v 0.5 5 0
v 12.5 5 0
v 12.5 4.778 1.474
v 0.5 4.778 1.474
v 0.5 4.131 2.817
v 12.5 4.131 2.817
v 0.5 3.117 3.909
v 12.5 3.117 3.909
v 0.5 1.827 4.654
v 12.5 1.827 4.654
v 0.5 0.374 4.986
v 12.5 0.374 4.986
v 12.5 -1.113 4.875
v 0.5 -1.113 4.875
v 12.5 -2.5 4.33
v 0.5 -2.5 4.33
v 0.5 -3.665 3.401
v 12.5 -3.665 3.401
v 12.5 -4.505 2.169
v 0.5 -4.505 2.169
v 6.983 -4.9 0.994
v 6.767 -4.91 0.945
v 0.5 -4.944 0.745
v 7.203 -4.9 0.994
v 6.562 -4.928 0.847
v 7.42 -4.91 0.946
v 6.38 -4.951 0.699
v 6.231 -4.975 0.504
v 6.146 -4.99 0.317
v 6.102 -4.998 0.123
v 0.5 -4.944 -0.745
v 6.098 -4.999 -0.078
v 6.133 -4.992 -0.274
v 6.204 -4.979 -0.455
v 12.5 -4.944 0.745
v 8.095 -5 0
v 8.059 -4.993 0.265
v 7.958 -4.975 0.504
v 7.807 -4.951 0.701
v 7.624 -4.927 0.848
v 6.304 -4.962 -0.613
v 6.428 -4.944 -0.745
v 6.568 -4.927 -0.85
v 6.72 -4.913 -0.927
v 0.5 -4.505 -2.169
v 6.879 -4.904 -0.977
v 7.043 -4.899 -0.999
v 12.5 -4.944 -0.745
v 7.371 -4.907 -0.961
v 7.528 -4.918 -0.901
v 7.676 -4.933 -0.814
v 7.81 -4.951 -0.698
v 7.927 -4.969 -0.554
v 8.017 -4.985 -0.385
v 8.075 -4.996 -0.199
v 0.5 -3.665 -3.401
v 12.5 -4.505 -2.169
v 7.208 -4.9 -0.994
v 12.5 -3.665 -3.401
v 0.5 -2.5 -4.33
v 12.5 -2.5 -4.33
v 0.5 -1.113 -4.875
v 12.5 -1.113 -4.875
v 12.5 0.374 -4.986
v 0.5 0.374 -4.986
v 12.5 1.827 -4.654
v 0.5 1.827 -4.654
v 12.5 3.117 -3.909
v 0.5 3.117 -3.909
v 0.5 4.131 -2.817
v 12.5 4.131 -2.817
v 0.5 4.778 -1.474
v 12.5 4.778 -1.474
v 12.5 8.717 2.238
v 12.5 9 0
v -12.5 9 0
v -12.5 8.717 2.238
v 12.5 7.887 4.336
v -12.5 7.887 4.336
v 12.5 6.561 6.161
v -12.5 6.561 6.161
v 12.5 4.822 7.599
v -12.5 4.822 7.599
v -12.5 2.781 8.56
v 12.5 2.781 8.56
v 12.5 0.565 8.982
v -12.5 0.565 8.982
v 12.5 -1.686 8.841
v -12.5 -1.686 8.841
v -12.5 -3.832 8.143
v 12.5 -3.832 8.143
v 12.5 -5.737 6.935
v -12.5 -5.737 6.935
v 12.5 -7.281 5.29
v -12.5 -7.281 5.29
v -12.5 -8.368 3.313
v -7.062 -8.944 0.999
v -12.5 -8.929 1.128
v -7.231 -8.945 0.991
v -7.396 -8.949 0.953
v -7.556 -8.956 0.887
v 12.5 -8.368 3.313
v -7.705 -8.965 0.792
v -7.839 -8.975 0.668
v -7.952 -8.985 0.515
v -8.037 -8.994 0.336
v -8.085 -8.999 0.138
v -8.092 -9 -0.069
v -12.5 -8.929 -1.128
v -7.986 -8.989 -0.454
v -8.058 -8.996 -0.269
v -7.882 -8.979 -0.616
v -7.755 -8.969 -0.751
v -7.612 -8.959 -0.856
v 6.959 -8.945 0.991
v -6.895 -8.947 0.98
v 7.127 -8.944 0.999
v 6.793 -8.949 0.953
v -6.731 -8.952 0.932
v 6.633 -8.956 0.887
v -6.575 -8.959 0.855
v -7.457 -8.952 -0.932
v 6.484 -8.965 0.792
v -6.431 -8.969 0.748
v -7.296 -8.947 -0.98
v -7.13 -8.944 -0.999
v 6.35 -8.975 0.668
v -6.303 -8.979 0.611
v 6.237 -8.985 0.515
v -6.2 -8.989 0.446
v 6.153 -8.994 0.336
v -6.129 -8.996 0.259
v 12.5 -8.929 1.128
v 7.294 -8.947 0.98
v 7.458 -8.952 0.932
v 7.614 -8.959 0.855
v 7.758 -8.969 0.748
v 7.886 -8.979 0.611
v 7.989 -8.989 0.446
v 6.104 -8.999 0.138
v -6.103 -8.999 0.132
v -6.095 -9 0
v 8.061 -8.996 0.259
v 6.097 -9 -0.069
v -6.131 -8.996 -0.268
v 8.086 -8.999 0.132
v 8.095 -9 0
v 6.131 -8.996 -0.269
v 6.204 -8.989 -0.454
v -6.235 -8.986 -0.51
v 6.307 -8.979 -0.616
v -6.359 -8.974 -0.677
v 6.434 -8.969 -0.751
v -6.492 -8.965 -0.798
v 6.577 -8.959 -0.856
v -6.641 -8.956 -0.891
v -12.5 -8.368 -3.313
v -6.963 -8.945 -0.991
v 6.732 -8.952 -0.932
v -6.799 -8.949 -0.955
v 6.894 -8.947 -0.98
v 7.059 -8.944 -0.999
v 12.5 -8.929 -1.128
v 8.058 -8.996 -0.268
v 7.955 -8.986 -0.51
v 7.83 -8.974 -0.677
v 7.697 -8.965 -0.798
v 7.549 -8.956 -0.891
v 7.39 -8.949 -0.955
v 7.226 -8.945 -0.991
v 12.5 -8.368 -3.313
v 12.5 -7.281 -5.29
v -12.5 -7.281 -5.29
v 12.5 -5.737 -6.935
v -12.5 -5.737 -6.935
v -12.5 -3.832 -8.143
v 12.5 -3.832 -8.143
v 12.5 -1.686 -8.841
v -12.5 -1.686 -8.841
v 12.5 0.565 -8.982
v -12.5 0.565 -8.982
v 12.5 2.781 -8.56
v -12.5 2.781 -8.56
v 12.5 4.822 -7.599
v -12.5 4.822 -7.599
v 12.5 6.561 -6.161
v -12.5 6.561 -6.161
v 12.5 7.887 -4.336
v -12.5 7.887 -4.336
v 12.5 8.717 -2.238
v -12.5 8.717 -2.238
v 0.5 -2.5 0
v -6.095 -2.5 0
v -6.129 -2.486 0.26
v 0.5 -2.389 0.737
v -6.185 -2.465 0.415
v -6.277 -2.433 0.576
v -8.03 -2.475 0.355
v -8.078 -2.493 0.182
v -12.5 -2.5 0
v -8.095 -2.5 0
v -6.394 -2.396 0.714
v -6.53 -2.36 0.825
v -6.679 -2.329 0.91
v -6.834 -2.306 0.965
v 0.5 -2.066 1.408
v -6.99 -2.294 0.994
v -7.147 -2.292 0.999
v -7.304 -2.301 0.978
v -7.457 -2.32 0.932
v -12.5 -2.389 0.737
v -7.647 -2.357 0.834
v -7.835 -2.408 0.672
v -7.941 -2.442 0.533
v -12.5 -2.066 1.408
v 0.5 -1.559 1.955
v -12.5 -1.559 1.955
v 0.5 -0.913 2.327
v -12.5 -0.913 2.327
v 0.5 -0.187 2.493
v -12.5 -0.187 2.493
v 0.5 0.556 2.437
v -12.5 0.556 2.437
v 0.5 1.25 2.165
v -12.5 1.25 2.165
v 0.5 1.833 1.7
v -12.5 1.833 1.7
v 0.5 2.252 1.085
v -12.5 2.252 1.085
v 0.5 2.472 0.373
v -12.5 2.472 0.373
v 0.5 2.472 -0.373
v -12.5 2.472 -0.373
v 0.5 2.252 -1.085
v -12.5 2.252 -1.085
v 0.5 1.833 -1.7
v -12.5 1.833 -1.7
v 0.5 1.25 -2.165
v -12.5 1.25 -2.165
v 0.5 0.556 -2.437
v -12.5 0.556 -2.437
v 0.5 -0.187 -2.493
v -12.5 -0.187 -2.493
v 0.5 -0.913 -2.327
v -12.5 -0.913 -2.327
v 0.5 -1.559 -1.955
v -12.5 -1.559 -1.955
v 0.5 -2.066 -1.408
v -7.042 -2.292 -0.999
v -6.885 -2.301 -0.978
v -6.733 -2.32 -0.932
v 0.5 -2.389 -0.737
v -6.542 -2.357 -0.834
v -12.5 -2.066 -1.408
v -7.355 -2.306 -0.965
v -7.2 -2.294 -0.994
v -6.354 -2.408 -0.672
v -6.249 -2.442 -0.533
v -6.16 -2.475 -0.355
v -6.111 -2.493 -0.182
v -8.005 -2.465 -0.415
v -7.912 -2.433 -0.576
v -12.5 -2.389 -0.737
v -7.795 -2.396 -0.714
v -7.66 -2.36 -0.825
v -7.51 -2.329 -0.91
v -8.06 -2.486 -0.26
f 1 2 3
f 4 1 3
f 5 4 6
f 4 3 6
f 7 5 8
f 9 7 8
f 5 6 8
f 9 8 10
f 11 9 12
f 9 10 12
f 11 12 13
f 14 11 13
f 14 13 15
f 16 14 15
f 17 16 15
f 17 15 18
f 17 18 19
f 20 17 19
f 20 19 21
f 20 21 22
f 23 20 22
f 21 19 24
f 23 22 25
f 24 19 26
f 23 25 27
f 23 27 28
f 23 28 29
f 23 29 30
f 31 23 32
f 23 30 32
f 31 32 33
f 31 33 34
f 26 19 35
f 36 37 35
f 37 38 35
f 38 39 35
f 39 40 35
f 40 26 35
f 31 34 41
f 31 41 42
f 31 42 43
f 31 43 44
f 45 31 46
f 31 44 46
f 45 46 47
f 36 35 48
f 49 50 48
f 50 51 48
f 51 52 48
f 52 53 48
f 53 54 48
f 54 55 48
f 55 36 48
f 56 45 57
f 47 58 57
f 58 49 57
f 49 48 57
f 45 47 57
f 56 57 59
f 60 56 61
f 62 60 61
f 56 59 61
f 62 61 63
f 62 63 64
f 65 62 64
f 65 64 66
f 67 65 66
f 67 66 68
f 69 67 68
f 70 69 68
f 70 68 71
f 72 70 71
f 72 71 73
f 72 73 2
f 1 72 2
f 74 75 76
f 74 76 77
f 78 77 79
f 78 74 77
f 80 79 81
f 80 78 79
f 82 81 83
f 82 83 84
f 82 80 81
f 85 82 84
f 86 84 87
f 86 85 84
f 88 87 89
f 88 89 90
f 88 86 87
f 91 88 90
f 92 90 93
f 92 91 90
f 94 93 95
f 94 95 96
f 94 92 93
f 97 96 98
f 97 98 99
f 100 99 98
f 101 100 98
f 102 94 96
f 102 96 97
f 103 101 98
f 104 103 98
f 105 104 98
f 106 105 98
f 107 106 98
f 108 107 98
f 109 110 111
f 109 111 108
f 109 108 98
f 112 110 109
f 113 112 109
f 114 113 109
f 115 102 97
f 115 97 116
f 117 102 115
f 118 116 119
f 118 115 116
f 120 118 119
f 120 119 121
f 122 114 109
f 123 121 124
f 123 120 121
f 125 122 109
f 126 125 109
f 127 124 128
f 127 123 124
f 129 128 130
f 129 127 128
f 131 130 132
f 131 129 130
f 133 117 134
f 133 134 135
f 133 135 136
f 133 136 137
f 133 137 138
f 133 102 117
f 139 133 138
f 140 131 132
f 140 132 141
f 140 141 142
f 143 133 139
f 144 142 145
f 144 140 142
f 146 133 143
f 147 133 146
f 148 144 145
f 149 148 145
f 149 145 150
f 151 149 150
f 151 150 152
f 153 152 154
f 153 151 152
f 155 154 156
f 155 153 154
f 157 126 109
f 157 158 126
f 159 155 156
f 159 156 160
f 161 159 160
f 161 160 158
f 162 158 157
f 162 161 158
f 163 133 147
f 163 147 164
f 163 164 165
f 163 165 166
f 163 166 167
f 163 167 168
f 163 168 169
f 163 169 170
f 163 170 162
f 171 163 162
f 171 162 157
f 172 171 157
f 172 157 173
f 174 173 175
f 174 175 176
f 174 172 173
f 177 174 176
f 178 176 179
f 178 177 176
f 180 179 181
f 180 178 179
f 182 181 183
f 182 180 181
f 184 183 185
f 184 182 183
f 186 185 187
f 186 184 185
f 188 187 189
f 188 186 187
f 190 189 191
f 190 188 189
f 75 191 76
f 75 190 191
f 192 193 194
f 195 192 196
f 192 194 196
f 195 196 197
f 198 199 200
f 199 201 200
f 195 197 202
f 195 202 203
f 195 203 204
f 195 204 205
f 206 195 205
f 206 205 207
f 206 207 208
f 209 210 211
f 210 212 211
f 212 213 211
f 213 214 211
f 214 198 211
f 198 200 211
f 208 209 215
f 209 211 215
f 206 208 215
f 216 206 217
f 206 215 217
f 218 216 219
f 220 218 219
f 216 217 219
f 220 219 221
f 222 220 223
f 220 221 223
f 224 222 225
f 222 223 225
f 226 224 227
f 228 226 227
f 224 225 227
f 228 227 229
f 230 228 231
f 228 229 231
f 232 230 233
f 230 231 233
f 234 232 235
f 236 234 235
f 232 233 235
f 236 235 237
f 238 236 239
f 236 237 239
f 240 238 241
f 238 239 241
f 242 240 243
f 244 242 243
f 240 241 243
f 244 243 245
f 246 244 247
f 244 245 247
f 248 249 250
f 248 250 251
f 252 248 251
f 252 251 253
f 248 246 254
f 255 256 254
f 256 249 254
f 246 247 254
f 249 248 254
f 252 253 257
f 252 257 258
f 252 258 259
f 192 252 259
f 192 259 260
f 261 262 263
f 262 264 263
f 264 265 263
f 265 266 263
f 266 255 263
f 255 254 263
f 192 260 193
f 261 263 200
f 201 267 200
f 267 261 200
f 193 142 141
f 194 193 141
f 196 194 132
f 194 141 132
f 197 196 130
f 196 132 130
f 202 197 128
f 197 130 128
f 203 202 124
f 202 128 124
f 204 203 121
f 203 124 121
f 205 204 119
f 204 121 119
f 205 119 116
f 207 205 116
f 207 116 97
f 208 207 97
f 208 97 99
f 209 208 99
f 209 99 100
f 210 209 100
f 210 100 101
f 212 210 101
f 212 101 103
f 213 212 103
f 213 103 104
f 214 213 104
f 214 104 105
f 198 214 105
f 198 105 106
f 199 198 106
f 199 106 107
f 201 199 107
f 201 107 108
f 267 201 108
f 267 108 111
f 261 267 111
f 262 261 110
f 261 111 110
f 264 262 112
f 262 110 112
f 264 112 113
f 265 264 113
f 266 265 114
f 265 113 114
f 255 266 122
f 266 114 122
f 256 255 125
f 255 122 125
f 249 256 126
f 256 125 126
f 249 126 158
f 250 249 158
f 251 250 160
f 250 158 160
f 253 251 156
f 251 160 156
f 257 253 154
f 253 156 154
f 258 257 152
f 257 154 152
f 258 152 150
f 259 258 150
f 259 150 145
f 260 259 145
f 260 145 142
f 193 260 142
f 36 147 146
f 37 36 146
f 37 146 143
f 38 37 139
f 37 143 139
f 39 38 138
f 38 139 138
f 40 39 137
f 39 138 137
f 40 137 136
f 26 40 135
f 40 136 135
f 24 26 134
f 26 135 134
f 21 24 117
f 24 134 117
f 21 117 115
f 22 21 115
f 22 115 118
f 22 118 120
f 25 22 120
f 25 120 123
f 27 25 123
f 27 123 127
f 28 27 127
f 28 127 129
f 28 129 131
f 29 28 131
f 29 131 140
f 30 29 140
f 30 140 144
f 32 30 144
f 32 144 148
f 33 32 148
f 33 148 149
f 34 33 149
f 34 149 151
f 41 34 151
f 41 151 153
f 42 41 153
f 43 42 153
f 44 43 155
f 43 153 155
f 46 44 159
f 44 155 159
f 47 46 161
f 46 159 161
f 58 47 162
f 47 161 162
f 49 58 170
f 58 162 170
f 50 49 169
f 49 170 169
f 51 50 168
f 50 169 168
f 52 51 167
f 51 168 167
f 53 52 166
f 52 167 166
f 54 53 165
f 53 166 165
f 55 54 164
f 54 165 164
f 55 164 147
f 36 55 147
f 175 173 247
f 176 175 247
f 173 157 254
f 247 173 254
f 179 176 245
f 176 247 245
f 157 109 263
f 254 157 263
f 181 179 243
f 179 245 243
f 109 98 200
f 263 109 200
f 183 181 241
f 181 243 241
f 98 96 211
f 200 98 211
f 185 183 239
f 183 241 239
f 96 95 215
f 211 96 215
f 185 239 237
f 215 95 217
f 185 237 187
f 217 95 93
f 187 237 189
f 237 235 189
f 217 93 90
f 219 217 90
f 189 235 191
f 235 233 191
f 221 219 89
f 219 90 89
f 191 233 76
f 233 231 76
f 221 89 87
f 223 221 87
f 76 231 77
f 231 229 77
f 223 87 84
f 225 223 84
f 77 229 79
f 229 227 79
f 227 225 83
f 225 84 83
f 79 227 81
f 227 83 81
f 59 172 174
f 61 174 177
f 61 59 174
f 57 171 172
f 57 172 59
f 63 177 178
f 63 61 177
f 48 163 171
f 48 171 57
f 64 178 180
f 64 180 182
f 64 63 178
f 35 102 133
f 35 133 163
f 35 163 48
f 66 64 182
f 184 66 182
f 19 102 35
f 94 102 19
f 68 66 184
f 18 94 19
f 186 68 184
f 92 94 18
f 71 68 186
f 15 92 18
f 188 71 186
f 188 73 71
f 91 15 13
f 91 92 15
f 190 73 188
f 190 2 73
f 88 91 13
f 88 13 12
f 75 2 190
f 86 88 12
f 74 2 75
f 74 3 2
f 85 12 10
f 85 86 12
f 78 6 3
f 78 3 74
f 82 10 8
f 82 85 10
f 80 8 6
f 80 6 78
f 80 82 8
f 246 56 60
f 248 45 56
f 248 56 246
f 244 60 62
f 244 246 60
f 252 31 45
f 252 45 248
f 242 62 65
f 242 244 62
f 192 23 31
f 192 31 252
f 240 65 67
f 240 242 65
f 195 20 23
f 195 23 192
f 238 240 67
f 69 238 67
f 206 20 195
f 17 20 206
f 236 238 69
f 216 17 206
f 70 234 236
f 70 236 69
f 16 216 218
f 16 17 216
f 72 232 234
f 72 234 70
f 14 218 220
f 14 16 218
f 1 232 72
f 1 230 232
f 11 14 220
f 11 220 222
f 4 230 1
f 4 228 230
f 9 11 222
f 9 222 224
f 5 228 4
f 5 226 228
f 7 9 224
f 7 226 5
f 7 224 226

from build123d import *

# Parameters (mm, degrees)
F0_R     = 9
F1_DEPTH = 12.5
F2_R     = 5
F3_DEPTH = 12
F4_R     = 2.5
F5_DEPTH = 13
F7_R     = 1
F8_DEPTH = 9


with BuildPart() as f1:
    # F0 (on Right) → F1 (new body, symmetric)
    with BuildSketch(Plane.YZ):
        Circle(F0_R)
    extrude(amount=F1_DEPTH, both=True)

    # F2 (on face) → F3 (cut)
    with BuildSketch(Plane.YZ.offset(12.5)):
        Circle(F2_R)
    extrude(amount=-F3_DEPTH, mode=Mode.SUBTRACT)

    # F4 (on face) → F5 (cut)
    with BuildSketch(Plane(origin=(-12.5, 0, 0), x_dir=(0, -1, 0), z_dir=(-1, 0, 0))):
        Circle(F4_R)
    extrude(amount=-F5_DEPTH, mode=Mode.SUBTRACT)

    # F7 (on offset) → F8 (cut)
    with BuildSketch(Plane.XZ.offset(9)):
        with Locations((7.094594, 0)):
            Circle(F7_R)
        with Locations((-7.094594, 0)):
            Circle(F7_R)
    extrude(amount=-F8_DEPTH, mode=Mode.SUBTRACT)


solid = f1.part
